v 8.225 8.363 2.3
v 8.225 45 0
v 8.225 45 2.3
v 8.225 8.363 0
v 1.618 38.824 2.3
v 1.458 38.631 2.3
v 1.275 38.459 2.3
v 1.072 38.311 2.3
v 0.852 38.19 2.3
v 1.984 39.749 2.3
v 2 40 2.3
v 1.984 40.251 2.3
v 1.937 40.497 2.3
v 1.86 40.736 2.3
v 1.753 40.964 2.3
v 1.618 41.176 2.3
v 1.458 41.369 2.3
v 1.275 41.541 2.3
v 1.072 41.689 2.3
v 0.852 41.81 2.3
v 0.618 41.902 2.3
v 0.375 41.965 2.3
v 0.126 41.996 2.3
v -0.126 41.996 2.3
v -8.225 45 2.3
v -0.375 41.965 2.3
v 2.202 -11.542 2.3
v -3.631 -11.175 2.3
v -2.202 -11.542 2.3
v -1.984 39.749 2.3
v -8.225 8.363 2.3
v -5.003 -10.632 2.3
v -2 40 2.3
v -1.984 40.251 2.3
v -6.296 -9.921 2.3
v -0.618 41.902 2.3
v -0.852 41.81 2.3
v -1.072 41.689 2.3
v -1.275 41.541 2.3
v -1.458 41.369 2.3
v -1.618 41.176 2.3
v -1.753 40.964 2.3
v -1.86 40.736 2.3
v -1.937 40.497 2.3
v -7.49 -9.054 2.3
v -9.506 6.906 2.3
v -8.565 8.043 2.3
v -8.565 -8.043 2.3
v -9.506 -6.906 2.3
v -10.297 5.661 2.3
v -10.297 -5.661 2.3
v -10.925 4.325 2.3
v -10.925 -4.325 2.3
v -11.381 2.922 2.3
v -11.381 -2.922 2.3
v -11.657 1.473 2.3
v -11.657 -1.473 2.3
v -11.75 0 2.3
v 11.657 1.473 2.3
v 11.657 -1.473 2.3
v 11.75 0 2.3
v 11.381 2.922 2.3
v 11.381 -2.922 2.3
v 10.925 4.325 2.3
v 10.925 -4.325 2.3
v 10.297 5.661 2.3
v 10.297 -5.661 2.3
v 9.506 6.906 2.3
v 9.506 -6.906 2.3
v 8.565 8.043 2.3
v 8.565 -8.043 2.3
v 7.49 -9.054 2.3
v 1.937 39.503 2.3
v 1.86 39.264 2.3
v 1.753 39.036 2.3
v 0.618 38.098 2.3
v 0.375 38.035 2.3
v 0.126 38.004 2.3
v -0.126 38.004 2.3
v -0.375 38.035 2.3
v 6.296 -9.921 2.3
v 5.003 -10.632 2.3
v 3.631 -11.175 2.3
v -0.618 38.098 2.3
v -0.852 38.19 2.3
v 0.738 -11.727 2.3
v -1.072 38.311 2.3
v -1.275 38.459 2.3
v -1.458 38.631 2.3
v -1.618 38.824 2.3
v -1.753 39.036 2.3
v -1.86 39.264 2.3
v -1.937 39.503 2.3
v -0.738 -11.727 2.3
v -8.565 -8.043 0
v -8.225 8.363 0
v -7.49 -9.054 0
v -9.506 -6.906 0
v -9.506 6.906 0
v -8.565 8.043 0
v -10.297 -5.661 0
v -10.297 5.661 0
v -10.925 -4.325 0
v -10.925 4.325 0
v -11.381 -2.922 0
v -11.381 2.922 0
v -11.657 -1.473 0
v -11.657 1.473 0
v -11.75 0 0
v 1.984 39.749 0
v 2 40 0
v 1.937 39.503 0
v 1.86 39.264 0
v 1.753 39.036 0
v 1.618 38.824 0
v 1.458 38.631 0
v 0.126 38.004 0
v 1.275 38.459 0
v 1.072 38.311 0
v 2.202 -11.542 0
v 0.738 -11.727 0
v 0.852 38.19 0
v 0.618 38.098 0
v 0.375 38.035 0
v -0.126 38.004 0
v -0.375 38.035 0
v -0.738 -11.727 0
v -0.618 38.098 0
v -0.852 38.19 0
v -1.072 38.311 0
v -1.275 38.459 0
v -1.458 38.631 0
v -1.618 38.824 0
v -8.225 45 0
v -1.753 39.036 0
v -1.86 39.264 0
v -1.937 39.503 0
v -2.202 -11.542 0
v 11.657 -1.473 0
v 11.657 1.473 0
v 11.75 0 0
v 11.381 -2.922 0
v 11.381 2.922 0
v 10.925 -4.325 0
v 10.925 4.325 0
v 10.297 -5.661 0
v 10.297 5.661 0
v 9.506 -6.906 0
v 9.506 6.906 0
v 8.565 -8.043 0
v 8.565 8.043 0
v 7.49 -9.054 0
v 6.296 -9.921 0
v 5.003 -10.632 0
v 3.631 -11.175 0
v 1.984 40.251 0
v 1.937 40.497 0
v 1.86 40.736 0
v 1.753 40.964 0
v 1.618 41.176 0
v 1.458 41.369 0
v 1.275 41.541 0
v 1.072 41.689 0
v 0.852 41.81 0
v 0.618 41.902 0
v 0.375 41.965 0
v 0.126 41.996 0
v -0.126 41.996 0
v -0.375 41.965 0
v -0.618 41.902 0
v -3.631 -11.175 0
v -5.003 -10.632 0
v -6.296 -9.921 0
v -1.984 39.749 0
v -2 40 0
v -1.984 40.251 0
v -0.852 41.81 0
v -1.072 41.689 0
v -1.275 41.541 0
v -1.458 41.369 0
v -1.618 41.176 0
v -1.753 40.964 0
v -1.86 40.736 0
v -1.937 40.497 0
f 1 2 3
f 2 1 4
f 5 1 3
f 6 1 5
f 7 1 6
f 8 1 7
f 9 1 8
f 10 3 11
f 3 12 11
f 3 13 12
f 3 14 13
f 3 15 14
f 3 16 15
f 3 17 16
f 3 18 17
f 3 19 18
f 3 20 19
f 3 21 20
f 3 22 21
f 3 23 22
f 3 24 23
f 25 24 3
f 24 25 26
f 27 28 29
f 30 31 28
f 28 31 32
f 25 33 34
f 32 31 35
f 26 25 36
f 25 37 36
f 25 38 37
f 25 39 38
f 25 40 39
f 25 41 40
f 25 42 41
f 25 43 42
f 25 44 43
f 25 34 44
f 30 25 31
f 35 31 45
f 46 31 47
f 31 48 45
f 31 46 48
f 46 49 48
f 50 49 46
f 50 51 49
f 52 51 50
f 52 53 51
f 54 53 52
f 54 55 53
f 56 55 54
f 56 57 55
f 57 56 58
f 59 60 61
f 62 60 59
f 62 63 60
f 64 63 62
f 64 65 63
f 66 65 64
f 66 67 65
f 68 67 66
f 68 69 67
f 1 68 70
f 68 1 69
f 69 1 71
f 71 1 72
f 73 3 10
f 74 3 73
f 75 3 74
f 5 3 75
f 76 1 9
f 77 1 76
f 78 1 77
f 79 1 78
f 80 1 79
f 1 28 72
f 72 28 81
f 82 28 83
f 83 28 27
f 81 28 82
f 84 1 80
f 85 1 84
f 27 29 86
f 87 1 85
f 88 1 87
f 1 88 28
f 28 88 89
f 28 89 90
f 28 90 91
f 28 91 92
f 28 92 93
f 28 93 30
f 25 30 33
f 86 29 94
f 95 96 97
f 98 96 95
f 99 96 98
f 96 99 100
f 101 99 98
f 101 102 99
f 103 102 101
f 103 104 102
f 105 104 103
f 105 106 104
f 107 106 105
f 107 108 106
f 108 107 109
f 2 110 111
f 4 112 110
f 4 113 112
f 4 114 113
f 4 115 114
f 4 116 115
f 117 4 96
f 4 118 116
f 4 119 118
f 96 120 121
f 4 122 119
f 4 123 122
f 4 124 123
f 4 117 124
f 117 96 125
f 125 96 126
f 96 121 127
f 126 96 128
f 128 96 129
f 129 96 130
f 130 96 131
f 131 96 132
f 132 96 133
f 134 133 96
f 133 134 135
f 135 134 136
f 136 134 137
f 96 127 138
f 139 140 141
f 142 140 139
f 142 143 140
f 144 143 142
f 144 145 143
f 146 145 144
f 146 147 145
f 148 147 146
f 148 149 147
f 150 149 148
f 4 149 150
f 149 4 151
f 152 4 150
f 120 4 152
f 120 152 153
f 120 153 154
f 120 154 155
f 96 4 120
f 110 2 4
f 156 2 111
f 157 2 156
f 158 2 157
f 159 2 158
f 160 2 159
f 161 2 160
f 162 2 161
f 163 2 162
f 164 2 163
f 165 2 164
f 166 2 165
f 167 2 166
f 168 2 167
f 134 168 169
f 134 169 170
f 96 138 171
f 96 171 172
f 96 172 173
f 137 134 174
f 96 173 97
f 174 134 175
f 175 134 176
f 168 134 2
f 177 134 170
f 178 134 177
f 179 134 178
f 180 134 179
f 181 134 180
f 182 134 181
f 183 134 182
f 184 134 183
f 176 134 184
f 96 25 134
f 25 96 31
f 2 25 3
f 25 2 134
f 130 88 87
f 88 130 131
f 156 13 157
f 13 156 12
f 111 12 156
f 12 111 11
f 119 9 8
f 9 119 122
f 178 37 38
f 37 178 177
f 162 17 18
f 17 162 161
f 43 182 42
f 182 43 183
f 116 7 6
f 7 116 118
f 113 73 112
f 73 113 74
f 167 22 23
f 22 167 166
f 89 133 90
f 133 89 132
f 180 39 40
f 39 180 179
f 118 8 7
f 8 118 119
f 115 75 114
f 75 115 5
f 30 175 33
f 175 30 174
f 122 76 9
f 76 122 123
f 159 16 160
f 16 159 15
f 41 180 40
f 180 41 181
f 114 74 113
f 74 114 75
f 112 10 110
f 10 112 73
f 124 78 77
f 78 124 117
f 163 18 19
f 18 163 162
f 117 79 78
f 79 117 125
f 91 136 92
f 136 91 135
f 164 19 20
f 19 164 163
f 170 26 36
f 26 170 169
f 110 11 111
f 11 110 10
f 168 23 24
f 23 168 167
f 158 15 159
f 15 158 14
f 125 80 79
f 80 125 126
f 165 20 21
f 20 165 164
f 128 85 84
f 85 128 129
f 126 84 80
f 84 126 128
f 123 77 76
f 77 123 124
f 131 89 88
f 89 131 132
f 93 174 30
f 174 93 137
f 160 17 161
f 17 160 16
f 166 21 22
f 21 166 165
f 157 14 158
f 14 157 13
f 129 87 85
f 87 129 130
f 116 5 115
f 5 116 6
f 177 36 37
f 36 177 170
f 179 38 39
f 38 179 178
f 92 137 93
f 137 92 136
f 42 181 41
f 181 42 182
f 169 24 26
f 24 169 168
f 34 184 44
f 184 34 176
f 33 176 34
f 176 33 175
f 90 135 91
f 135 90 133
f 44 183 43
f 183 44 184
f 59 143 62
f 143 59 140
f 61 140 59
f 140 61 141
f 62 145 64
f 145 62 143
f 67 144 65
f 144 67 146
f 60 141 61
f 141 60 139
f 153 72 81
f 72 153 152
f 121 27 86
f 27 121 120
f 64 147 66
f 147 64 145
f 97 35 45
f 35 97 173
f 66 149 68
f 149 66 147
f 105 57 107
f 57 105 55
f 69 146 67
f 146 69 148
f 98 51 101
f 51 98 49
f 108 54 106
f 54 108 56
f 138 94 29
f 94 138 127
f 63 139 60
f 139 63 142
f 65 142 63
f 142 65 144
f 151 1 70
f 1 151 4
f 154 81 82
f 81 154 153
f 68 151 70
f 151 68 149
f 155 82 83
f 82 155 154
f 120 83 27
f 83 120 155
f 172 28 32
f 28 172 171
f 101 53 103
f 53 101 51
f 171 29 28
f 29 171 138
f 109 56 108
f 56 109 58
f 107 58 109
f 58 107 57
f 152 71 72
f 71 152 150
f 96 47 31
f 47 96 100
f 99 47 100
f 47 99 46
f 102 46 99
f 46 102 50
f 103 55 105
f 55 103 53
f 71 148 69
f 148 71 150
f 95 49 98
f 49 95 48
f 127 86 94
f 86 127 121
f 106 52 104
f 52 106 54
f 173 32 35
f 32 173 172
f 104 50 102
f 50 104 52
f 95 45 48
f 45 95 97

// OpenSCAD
//Height of the thing. Should be about the same height as the coins.
height = 2.3;
//Diameter of the coin the supermarket carts accept (If they accept two sizes, it's probably a good idea to pick something in between)
coindiameter = 23.5;
//Length of the holderthingy in the back. measured from the senter of the coin
holderlength = 45;
//Optional dxf file if you want to have some logo on your thing. Won't work in customizer, so simply leave it empty.
//dxffile = "teardrop.dxf";
dxffile = "";

module SupermarketCoin(height, coindiameter, holderlength, dxffile = "")  {
	difference() {
		union() {
			cylinder(h=height, r=coindiameter/2, $fn=50);
			
			difference() {
				translate([-coindiameter*0.35, 0, 0])
				cube([coindiameter*0.7, holderlength, height]);
				translate([0, holderlength - 5, 0])
				cylinder(h=height, r=2, $fn=50);
			}
		}
		if (dxffile != "") {
			translate([0,0,height-0.5])
			rotate([0, 0, 180])
			linear_extrude(height=0.5)
			import(dxffile);
		}
	}
}

SupermarketCoin(height, coindiameter, holderlength, dxffile);
